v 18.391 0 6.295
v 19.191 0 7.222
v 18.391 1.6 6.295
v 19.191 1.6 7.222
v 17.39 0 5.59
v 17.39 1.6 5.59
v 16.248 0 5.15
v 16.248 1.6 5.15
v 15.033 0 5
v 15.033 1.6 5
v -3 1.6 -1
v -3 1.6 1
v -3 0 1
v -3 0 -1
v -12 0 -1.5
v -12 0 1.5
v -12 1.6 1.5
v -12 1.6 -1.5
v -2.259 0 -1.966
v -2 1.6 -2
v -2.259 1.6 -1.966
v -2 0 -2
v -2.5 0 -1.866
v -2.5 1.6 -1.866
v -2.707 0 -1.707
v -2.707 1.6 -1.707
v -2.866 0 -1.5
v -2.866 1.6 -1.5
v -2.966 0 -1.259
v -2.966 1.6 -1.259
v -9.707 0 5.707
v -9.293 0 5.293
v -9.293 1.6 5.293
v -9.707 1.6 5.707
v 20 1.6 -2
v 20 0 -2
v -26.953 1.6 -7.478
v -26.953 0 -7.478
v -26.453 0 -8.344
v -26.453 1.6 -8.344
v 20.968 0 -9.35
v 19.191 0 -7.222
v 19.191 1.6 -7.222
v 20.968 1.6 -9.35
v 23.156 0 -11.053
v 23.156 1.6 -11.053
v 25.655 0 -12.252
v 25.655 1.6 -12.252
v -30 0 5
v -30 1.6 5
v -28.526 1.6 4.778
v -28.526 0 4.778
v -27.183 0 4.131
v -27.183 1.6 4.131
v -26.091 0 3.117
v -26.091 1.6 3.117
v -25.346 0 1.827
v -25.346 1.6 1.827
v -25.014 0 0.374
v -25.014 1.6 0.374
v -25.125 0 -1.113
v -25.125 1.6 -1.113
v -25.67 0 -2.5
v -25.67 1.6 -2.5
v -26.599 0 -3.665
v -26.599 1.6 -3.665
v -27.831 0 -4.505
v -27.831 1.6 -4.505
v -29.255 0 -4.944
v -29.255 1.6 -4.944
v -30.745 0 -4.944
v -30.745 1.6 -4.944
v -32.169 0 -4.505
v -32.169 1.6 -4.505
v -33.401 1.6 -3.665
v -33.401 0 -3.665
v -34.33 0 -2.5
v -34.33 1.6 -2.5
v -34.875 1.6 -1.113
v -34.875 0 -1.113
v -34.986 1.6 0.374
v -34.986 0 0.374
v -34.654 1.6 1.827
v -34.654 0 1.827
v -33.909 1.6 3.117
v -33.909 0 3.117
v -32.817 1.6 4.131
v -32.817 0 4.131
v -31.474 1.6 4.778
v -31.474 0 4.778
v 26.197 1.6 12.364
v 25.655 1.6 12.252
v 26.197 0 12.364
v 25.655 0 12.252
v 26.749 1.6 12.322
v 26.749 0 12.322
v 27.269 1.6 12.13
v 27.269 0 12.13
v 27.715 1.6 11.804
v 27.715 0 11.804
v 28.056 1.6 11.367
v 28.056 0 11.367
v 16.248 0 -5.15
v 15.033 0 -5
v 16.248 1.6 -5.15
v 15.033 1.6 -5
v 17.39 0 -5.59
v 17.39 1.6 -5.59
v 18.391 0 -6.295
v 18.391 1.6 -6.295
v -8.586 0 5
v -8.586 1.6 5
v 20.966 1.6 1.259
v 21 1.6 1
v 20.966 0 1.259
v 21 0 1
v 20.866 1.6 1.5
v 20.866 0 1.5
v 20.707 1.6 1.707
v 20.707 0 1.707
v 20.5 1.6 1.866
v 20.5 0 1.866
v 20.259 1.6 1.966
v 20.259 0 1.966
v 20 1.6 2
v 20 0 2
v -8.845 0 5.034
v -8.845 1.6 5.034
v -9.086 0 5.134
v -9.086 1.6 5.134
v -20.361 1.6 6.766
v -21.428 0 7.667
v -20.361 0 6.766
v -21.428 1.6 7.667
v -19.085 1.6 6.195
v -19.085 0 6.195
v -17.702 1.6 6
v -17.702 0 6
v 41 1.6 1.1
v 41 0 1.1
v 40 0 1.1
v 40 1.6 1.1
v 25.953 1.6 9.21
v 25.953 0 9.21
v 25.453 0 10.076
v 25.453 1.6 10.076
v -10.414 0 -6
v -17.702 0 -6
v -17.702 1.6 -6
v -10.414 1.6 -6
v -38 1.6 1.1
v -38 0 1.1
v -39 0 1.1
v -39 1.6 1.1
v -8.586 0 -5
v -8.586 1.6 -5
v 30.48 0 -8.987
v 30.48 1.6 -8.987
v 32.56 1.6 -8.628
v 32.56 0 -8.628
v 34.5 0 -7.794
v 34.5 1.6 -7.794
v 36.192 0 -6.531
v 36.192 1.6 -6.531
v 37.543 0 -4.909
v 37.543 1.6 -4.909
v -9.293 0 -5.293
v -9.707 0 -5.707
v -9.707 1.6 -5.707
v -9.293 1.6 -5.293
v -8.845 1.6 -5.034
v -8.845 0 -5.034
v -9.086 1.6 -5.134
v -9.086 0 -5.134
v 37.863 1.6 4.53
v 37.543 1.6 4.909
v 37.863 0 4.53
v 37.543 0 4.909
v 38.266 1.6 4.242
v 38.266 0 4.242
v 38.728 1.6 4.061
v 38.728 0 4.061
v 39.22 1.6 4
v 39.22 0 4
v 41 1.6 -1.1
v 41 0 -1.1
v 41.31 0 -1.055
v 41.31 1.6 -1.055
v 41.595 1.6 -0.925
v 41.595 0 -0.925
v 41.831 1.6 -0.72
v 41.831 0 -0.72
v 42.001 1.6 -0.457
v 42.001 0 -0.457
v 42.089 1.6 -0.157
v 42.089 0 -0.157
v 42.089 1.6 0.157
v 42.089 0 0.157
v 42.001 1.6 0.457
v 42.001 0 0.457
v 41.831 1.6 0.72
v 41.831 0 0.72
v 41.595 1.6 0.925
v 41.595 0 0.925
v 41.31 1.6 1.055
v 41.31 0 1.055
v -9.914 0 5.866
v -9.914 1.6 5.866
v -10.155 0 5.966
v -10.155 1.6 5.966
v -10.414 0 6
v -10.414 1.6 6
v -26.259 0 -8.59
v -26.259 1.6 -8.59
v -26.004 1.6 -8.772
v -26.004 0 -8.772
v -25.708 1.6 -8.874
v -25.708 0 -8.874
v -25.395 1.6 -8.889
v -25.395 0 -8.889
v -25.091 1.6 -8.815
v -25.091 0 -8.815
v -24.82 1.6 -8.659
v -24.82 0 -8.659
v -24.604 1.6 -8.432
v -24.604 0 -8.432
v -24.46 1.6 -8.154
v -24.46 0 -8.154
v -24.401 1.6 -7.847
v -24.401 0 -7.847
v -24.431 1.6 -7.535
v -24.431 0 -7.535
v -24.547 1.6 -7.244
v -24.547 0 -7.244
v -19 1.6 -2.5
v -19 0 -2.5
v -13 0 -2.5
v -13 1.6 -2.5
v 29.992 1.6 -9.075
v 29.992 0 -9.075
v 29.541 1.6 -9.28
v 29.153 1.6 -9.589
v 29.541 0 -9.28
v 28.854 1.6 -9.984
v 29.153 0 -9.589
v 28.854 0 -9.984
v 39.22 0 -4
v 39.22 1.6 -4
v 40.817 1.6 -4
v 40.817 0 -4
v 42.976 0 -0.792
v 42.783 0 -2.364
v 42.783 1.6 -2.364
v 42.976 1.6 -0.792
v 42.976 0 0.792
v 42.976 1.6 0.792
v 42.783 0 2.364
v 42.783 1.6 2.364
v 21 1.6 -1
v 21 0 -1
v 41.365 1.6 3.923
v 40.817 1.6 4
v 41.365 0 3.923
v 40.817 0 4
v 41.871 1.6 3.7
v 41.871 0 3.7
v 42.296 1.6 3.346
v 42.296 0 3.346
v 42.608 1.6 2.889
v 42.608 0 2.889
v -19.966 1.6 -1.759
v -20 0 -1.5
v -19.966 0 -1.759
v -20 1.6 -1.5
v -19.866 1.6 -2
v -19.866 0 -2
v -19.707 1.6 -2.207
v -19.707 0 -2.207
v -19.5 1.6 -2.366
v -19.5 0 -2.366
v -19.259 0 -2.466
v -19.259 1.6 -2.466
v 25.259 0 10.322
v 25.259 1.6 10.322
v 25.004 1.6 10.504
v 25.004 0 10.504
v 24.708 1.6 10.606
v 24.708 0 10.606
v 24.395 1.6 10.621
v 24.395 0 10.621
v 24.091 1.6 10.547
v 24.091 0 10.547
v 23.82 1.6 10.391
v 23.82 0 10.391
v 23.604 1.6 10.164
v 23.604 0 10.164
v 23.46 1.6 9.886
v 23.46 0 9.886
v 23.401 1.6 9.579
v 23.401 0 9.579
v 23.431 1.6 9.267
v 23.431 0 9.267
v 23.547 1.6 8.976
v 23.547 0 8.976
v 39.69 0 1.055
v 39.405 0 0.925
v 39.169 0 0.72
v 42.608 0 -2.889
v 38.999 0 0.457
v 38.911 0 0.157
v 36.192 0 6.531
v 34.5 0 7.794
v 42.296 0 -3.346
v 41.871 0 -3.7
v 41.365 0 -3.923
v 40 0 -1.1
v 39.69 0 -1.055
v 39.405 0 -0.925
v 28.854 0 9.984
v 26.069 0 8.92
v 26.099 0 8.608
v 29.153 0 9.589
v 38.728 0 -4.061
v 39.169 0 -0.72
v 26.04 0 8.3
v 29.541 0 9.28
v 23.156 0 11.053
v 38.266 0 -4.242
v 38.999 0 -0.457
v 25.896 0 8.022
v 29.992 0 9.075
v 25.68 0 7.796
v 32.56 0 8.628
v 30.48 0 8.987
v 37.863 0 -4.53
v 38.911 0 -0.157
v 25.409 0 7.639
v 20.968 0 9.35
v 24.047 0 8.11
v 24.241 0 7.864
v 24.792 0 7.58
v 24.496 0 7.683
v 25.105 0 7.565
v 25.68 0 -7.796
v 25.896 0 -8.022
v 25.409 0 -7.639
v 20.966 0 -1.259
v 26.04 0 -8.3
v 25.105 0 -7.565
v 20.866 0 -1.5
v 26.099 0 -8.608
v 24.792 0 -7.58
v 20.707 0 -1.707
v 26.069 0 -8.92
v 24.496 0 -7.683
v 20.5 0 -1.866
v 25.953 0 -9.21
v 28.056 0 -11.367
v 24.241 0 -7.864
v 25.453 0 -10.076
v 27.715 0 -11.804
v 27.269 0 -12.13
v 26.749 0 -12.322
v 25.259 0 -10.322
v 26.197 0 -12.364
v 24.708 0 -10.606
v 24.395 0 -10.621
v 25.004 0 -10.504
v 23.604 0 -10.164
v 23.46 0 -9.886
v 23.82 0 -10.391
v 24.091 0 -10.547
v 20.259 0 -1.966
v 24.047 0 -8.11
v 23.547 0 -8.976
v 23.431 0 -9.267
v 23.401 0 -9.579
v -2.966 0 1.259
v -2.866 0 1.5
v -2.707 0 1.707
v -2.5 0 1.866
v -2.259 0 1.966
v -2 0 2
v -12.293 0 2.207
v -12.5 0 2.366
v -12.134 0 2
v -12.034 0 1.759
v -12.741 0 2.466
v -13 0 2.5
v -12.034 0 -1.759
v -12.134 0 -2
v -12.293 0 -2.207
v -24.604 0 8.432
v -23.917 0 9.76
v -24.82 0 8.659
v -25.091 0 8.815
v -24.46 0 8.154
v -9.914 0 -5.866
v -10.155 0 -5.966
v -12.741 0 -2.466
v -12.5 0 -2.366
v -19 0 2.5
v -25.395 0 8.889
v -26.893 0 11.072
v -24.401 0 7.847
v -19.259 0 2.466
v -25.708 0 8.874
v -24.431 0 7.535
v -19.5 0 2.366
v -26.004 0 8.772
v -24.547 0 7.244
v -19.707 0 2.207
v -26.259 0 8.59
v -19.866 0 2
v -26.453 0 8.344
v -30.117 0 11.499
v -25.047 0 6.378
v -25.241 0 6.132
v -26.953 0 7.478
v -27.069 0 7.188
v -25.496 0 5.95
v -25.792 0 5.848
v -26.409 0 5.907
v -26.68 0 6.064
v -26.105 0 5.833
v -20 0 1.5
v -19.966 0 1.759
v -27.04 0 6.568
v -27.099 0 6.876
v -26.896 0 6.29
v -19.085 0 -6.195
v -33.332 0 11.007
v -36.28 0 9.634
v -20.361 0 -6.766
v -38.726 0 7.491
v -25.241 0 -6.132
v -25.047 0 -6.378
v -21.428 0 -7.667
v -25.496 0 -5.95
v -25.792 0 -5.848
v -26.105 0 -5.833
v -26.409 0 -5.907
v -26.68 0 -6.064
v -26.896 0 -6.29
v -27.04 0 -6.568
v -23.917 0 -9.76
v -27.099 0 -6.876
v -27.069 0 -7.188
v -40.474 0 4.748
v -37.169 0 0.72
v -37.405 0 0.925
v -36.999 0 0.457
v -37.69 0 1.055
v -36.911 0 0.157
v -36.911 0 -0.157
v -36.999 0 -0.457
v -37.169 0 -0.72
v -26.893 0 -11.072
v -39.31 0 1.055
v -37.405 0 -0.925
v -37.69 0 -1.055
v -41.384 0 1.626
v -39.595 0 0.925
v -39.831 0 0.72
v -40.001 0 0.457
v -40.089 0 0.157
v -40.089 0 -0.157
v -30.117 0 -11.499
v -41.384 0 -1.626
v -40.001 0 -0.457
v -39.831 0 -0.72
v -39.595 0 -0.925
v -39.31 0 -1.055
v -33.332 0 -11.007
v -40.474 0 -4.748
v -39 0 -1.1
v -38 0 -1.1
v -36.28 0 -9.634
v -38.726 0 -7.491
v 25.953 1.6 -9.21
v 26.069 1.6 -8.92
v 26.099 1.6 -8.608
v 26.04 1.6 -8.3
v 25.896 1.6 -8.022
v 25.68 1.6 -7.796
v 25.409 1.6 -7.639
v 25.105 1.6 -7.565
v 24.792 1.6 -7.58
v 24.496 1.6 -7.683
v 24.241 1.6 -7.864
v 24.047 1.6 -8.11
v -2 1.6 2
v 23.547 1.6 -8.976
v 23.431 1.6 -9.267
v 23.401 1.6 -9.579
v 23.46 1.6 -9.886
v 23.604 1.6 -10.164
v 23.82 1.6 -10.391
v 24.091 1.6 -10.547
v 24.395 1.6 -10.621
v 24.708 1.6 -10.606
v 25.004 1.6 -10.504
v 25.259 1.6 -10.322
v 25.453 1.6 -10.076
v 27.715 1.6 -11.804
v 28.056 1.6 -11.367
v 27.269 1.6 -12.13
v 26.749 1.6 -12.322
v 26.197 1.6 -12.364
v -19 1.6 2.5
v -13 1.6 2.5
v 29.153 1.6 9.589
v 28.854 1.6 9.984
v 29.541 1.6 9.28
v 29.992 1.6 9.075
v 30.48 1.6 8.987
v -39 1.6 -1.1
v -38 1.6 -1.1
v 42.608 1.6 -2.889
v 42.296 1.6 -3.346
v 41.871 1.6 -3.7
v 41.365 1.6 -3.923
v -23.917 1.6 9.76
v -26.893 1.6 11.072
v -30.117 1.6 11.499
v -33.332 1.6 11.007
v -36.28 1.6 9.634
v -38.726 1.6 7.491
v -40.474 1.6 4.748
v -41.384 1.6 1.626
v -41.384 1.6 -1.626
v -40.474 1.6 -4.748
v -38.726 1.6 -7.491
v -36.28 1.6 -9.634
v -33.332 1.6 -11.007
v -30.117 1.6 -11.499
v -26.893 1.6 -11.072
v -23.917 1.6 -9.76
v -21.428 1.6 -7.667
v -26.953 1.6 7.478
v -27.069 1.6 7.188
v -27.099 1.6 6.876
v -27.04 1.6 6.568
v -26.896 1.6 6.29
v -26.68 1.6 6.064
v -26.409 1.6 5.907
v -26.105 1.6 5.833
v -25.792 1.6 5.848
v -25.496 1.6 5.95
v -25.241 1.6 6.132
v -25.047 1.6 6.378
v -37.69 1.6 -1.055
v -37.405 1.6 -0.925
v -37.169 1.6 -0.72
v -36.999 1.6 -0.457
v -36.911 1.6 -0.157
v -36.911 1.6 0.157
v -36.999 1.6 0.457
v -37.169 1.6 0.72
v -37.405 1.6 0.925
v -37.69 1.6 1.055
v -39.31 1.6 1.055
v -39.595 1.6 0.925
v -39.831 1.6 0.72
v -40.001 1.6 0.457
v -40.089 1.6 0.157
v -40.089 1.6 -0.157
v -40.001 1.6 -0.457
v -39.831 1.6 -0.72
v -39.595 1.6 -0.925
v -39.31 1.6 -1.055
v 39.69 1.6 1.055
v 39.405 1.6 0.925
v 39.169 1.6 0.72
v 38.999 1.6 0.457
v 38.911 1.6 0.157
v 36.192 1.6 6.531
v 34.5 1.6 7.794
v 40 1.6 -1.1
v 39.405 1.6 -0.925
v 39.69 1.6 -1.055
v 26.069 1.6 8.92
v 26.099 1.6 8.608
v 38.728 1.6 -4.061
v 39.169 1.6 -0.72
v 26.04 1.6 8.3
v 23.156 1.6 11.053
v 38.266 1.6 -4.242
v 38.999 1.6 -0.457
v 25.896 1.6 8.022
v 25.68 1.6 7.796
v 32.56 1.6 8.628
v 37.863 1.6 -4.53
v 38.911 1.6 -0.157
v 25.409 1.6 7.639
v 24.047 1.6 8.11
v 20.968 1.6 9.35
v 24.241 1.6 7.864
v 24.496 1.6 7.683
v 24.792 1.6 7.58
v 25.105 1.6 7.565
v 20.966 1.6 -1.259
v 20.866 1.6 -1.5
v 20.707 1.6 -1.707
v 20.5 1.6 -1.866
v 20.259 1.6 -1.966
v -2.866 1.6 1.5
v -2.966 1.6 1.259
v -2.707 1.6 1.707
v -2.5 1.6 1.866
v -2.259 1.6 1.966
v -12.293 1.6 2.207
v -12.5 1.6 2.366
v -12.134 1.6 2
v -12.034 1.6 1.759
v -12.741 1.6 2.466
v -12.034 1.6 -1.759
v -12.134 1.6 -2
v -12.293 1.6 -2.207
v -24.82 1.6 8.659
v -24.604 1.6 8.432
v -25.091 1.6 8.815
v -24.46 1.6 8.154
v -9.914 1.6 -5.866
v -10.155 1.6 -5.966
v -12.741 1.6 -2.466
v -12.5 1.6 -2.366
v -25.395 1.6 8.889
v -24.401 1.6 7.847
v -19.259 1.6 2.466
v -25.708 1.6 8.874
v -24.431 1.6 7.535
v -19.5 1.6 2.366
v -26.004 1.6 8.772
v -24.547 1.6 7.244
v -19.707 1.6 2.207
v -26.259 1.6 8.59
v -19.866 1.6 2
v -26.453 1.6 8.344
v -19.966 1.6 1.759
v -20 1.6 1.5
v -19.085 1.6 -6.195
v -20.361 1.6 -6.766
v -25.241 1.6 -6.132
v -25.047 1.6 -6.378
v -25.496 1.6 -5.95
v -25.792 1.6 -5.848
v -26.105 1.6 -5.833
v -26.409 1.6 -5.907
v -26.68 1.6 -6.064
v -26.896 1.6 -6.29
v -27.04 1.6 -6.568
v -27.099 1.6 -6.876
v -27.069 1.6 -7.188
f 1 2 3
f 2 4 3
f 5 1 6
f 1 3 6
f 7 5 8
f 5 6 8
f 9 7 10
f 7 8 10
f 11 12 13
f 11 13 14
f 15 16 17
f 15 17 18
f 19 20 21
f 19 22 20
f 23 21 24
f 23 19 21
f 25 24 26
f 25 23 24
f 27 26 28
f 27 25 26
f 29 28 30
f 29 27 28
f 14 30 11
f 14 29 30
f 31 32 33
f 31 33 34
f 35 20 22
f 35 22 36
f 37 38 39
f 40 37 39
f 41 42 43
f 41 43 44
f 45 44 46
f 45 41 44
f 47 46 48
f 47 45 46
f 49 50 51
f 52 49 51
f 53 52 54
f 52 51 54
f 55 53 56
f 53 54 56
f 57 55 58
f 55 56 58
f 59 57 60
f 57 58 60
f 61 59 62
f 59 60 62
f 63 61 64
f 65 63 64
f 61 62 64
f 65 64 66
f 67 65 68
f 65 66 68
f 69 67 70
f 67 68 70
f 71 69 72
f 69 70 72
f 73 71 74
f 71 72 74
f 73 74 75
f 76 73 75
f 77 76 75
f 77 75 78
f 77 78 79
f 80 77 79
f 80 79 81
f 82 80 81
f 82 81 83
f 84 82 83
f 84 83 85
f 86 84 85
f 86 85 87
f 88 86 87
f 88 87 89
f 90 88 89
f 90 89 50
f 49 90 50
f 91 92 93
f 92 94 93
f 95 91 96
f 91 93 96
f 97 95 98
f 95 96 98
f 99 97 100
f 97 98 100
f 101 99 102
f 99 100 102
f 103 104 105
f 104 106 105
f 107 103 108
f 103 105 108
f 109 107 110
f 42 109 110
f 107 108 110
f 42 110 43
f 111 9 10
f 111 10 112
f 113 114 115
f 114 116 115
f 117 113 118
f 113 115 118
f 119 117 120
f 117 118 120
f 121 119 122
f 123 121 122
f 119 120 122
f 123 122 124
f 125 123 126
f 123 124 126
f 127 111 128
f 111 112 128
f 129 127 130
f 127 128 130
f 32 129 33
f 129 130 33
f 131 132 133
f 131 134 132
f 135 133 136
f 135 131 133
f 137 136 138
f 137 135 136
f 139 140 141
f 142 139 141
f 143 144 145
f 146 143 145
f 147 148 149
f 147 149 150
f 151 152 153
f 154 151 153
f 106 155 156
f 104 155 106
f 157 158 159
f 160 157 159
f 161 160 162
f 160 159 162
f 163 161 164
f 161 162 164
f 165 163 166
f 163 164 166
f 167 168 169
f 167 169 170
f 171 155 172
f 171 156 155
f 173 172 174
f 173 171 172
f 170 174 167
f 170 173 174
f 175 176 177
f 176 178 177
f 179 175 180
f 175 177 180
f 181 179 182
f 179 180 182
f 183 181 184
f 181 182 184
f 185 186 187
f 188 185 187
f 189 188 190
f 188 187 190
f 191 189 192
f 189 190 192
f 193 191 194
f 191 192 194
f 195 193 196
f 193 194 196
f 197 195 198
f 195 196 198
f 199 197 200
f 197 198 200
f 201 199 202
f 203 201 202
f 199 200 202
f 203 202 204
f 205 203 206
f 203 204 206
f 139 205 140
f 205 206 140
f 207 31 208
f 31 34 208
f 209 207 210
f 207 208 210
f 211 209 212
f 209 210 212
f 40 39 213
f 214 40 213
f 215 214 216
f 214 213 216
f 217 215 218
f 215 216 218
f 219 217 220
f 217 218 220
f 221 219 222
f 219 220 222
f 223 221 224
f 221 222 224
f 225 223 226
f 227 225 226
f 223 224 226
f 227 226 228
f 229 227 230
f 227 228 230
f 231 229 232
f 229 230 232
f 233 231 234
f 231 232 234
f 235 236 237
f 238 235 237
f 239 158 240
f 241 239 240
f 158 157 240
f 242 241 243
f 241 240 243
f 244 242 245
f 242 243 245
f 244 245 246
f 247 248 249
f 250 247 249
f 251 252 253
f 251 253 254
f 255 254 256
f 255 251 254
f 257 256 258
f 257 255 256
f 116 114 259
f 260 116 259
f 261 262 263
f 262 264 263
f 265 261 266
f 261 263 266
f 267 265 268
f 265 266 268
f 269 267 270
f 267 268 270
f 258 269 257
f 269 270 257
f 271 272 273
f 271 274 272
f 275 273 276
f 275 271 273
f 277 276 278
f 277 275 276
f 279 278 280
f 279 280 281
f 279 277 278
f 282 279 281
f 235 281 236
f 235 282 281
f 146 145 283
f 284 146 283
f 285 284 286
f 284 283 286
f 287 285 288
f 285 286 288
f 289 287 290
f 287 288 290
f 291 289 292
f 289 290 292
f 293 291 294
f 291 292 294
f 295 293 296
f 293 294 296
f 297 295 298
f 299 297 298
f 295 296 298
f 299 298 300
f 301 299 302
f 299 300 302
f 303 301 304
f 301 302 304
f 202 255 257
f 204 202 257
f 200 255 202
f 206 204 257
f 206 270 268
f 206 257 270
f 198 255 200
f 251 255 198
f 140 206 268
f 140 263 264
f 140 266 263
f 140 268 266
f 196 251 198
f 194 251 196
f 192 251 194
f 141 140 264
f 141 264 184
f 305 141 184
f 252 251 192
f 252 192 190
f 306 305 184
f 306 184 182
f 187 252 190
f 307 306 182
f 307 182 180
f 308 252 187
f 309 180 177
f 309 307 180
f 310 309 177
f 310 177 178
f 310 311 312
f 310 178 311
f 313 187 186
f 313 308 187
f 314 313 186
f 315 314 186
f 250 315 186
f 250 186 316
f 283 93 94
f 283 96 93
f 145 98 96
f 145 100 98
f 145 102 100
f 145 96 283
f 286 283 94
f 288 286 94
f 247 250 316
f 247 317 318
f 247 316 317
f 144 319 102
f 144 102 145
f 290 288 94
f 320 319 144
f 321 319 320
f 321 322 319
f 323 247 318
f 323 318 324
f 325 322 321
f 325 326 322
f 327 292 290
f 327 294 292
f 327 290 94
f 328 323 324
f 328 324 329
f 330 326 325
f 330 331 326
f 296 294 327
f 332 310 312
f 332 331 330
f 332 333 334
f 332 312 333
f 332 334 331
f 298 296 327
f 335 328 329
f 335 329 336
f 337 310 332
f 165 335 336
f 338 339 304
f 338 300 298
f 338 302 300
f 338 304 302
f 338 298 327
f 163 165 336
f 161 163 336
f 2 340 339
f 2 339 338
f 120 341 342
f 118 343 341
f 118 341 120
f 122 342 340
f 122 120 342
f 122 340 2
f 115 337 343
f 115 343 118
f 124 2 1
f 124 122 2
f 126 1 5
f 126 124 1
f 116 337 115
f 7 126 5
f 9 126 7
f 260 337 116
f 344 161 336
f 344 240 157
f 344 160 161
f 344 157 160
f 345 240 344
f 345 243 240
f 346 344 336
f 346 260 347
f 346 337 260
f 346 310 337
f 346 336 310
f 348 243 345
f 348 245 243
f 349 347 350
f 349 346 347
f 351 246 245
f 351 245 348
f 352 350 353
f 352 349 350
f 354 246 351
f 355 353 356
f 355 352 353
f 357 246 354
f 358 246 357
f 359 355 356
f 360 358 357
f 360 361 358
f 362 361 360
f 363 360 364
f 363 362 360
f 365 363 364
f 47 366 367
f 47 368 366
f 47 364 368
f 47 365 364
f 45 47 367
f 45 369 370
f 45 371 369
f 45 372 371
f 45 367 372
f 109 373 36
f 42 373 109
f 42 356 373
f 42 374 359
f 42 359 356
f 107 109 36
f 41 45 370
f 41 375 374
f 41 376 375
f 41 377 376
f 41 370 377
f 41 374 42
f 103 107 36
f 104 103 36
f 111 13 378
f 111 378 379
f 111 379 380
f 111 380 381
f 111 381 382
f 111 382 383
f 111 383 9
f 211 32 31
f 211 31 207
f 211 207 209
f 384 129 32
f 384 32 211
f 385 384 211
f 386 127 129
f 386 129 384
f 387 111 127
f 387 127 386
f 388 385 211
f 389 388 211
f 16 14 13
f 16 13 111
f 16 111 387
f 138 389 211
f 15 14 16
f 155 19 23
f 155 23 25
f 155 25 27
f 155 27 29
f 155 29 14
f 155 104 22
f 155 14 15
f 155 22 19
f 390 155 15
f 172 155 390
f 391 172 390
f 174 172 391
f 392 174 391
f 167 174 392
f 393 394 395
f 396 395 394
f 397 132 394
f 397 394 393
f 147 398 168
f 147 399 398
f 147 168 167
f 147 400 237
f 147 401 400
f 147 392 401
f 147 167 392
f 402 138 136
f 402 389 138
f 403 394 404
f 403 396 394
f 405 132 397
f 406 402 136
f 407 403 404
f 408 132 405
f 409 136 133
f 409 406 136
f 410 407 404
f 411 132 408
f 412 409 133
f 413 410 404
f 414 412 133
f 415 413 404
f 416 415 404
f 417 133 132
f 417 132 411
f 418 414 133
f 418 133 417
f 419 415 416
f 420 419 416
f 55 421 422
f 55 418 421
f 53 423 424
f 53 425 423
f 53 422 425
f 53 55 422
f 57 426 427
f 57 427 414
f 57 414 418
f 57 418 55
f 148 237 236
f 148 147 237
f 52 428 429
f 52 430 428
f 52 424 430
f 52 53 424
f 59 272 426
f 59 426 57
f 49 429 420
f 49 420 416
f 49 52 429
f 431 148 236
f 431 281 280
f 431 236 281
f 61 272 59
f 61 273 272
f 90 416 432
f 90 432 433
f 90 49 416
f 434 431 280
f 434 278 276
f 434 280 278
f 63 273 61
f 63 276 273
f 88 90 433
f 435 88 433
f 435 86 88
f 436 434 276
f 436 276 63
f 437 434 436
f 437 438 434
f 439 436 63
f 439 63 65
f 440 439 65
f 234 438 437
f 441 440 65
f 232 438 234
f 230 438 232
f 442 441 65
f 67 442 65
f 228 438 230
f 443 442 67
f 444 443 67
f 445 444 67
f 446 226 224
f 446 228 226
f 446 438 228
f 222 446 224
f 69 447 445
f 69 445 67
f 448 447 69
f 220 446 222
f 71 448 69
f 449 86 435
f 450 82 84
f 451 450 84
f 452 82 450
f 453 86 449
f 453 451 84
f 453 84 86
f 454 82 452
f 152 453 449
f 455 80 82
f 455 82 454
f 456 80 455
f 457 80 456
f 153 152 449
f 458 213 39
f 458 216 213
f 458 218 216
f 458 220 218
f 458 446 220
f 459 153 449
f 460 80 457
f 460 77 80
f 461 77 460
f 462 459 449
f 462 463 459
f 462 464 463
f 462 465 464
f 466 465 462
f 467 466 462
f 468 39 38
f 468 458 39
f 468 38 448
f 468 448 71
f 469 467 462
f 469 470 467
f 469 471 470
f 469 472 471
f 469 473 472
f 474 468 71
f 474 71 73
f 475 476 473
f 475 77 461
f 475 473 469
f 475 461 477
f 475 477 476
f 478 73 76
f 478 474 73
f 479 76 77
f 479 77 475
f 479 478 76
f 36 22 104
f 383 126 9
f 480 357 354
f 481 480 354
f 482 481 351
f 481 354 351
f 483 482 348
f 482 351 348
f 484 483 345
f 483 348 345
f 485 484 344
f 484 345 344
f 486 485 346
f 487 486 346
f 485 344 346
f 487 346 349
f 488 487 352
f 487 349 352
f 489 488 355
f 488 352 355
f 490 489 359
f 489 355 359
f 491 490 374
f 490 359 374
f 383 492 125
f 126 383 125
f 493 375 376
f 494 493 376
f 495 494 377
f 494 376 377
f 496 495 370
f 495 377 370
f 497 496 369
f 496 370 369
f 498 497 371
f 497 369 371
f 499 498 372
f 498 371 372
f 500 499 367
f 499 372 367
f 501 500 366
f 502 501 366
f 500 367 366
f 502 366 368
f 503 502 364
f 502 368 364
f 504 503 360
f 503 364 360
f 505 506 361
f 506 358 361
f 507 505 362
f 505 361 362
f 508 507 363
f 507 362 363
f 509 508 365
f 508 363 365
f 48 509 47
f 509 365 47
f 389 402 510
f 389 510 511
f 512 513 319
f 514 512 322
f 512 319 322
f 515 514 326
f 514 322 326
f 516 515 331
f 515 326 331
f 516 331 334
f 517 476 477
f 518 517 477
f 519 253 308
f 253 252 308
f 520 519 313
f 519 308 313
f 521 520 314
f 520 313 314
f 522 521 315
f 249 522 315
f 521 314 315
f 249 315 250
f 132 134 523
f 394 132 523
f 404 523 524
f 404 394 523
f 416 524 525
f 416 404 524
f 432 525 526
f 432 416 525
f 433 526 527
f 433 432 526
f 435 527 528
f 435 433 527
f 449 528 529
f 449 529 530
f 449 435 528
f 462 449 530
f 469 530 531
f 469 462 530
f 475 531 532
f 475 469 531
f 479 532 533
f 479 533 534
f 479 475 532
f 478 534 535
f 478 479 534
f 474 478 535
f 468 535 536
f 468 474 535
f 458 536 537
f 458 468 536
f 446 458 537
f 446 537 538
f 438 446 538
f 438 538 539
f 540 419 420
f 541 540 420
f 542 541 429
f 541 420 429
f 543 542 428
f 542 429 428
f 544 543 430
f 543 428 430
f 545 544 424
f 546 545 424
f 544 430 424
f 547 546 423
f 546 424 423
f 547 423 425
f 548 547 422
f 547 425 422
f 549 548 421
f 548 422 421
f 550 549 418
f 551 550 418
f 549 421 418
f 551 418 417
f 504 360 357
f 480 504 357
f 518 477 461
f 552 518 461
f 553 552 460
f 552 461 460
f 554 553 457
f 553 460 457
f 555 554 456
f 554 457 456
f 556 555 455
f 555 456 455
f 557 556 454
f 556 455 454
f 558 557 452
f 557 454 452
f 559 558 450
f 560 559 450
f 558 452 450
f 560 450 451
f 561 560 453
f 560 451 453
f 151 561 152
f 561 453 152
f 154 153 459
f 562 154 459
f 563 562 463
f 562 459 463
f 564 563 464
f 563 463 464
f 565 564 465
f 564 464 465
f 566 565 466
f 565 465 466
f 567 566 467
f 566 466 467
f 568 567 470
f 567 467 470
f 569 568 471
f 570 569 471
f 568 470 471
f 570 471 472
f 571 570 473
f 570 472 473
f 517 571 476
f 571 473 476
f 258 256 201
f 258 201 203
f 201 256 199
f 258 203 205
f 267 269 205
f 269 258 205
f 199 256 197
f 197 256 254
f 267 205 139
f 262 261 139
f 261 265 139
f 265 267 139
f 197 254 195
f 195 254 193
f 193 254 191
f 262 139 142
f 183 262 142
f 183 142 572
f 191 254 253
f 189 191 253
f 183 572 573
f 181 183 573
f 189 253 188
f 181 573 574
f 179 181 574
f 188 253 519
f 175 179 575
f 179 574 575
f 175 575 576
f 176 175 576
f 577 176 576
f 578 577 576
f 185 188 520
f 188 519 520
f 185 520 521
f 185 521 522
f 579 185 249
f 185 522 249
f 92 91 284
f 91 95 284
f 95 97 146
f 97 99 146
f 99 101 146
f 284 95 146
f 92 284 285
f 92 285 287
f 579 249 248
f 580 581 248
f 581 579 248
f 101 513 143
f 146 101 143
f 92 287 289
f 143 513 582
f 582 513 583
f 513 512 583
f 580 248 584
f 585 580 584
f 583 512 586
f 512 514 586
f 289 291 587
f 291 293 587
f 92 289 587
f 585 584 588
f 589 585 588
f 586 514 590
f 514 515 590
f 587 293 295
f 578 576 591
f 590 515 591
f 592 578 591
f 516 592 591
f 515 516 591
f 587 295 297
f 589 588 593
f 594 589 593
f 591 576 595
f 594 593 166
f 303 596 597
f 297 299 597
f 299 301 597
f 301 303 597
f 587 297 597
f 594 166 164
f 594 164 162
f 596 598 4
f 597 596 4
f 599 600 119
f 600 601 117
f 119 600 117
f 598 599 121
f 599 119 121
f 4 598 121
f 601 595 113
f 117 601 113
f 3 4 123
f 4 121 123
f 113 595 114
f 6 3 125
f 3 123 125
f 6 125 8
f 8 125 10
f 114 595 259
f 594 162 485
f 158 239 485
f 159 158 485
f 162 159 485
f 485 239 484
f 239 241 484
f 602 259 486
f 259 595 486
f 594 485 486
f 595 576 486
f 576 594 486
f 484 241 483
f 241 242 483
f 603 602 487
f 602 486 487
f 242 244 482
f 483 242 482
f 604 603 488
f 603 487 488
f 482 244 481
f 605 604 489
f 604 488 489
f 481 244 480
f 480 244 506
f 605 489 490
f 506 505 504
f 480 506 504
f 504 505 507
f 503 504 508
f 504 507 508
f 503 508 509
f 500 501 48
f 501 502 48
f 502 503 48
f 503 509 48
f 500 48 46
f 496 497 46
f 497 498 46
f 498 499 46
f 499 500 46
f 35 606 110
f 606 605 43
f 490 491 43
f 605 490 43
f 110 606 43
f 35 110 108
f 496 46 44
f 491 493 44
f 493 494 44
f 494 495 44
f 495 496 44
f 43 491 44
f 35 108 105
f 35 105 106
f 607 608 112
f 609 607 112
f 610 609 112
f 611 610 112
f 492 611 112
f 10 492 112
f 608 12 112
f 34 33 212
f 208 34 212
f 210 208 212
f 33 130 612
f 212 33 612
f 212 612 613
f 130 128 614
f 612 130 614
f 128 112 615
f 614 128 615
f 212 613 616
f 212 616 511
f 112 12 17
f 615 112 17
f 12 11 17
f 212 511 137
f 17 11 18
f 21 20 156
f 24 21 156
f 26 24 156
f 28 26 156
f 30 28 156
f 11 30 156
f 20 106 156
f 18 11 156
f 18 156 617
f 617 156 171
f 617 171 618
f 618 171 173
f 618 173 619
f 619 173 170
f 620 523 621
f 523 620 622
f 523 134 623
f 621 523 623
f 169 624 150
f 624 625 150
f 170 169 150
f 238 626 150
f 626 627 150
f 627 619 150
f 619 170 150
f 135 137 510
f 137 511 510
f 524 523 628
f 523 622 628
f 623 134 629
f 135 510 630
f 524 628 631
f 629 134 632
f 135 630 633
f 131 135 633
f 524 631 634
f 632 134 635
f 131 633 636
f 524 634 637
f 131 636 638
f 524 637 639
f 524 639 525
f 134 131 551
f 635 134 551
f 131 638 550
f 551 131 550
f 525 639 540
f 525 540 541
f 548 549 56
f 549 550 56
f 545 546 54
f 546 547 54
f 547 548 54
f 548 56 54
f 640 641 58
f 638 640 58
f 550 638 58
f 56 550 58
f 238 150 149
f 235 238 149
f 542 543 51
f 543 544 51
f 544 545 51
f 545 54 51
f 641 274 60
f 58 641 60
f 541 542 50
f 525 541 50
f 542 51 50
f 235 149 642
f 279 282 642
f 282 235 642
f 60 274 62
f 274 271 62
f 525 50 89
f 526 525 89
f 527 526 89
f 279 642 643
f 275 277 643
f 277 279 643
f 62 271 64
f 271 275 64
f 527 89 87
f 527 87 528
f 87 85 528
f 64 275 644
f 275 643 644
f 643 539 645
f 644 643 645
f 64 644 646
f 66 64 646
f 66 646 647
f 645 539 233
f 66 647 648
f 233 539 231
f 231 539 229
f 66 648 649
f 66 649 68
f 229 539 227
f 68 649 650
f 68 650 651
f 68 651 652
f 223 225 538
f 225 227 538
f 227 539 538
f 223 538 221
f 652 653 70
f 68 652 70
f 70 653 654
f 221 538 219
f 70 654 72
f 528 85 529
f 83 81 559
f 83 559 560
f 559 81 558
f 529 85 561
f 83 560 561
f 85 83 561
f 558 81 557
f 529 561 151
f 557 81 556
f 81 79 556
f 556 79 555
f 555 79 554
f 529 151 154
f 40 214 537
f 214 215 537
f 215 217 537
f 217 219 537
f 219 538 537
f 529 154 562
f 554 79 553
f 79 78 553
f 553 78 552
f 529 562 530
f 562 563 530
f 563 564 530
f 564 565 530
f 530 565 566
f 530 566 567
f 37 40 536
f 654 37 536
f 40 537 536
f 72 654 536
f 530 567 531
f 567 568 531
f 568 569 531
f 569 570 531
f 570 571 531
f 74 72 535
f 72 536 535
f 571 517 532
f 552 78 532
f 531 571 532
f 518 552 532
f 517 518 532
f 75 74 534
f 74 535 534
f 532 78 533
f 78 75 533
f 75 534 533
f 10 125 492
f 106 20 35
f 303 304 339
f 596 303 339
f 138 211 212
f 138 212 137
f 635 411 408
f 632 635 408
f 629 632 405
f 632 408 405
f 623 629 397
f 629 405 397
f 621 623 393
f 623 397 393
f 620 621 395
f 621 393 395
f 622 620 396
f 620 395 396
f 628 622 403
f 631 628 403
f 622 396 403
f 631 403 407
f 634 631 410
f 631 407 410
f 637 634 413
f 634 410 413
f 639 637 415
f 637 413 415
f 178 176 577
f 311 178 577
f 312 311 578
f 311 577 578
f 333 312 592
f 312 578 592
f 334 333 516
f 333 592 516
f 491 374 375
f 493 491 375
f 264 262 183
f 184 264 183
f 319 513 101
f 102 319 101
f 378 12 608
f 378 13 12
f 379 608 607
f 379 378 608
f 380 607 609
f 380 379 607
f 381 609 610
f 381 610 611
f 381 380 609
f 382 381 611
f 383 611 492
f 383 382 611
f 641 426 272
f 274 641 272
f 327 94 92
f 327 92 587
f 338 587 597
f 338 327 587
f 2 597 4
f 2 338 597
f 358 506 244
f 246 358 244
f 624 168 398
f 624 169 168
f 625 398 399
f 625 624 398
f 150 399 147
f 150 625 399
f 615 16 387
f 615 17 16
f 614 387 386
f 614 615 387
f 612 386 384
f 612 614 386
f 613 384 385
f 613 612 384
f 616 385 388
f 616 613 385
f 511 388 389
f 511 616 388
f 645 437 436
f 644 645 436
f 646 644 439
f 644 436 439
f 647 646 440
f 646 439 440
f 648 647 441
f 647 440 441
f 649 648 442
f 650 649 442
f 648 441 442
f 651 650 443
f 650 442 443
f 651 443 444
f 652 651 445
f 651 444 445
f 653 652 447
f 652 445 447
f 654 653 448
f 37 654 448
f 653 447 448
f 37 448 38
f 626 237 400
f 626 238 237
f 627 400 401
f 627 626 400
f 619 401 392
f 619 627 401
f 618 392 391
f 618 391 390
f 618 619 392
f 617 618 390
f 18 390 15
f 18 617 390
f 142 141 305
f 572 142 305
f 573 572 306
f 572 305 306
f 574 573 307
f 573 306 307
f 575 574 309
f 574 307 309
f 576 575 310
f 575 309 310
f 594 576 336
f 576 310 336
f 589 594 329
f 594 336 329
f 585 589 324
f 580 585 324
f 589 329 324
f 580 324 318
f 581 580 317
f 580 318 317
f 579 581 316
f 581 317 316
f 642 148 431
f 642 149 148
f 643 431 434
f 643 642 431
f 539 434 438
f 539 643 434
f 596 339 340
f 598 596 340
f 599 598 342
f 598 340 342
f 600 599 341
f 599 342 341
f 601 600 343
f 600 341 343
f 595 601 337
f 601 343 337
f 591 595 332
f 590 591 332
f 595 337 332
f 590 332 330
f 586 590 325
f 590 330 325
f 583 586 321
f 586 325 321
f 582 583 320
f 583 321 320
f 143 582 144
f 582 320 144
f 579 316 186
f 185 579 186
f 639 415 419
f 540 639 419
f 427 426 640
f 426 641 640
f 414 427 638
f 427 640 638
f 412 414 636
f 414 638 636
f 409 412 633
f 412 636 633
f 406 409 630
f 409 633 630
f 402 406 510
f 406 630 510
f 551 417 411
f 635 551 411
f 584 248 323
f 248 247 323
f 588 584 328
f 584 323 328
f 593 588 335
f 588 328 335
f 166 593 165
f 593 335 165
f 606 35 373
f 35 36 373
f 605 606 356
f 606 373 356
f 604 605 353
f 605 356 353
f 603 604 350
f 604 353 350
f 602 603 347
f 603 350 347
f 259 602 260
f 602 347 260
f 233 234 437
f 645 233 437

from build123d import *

# Parameters (mm, degrees)
BOSS_EXTRUDE1_DEPTH = 1.6
CUT_EXTRUDE1_DEPTH  = 45.950639595
CUT_EXTRUDE2_DEPTH  = 45.950639595
FILLET1_R           = 5
SKETCH4_W           = 8
SKETCH4_H           = 5
CUT_EXTRUDE3_DEPTH  = 45.950639595
FILLET2_R           = 1
FILLET3_R           = 1
SKETCH6_W           = 24
SKETCH6_H           = 4
CUT_EXTRUDE4_DEPTH  = 45.950639595
SKETCH7_R           = 5
CUT_EXTRUDE5_DEPTH  = 45.950639595
FILLET4_R           = 1
CUT_EXTRUDE6_DEPTH  = 45.950639595
CIRPATTERN1_COUNT   = 2
CIRPATTERN1_ANGLE   = 120
FILLET5_R           = 2


with BuildPart() as part:
    # Sketch1 → Boss-Extrude1 (new body)
    with BuildSketch(Plane(origin=(0, 0, 0), x_dir=(1, 0, 0), z_dir=(0, 1, 0))):
        with BuildLine():
            Line((-9, 5), (18, 5))
            ThreePointArc((18, 5), (43, 0), (18, -5))
            Line((18, -5), (-9, -5))
            Line((-9, -5), (-10, -6))
            Line((-10, -6), (-20.189291565, -6))
            ThreePointArc((-20.189291565, -6), (-41.5, 0), (-20.189291565, 6))
            Line((-20.189291565, 6), (-10, 6))
            Line((-10, 6), (-9, 5))
        make_face()
    extrude(amount=BOSS_EXTRUDE1_DEPTH)

    # Sketch2 → Cut-Extrude1 (cut, through all)
    with BuildSketch(Plane(origin=(0, 0, 0), x_dir=(1, 0, 0), z_dir=(0, 1, 0))):
        with BuildLine():
            Line((40, 1.1), (41, 1.1))
            ThreePointArc((41, 1.1), (42.1, 0), (41, -1.1))
            Line((41, -1.1), (40, -1.1))
            ThreePointArc((40, -1.1), (38.9, 0), (40, 1.1))
        make_face()
        with BuildLine():
            Line((25.952627944, -9.210254038), (25.452627944, -10.076279442))
            ThreePointArc((25.452627944, -10.076279442), (23.95, -10.478907386), (23.547372056, -8.976279442))
            Line((23.547372056, -8.976279442), (24.047372056, -8.110254038))
            ThreePointArc((24.047372056, -8.110254038), (25.55, -7.707626094), (25.952627944, -9.210254038))
        make_face()
        with BuildLine():
            Line((24.047372056, 8.110254038), (23.547372056, 8.976279442))
            ThreePointArc((23.547372056, 8.976279442), (23.95, 10.478907386), (25.452627944, 10.076279442))
            Line((25.452627944, 10.076279442), (25.952627944, 9.210254038))
            ThreePointArc((25.952627944, 9.210254038), (25.55, 7.707626094), (24.047372056, 8.110254038))
        make_face()
    extrude(amount=CUT_EXTRUDE1_DEPTH, mode=Mode.SUBTRACT)

    # Sketch3 → Cut-Extrude2 (cut, through all)
    with BuildSketch(Plane(origin=(0, 0, 0), x_dir=(1, 0, 0), z_dir=(0, 1, 0))):
        with BuildLine():
            Line((-25.047372056, -6.37820323), (-24.547372056, -7.244228634))
            ThreePointArc((-24.547372056, -7.244228634), (-24.95, -8.746856578), (-26.452627944, -8.344228634))
            Line((-26.452627944, -8.344228634), (-26.952627944, -7.47820323))
            ThreePointArc((-26.952627944, -7.47820323), (-26.55, -5.975575286), (-25.047372056, -6.37820323))
        make_face()
        with BuildLine():
            Line((-38, -1.1), (-39, -1.1))
            ThreePointArc((-39, -1.1), (-40.1, 0), (-39, 1.1))
            Line((-39, 1.1), (-38, 1.1))
            ThreePointArc((-38, 1.1), (-36.9, 0), (-38, -1.1))
        make_face()
        with BuildLine():
            Line((-26.952627944, 7.47820323), (-26.452627944, 8.344228634))
            ThreePointArc((-26.452627944, 8.344228634), (-24.95, 8.746856578), (-24.547372056, 7.244228634))
            Line((-24.547372056, 7.244228634), (-25.047372056, 6.37820323))
            ThreePointArc((-25.047372056, 6.37820323), (-26.55, 5.975575286), (-26.952627944, 7.47820323))
        make_face()
    extrude(amount=CUT_EXTRUDE2_DEPTH, mode=Mode.SUBTRACT)

    # Fillet1
    fillet1_edges = [part.edges().sort_by_distance(p)[0] for p in [
        (18, 0.8, -5),
        (-20.189291565, 0.8, -6),
        (-20.189291565, 0.8, 6),
        (18, 0.8, 5),
    ]]
    fillet(fillet1_edges, radius=FILLET1_R)

    # Sketch4 → Cut-Extrude3 (cut, through all)
    with BuildSketch(Plane(origin=(0, 0, 0), x_dir=(1, 0, 0), z_dir=(0, 1, 0))):
        with Locations((-16, 0)):
            Rectangle(SKETCH4_W, SKETCH4_H)
    extrude(amount=CUT_EXTRUDE3_DEPTH, mode=Mode.SUBTRACT)

    # Fillet2
    fillet2_edges = [part.edges().sort_by_distance(p)[0] for p in [
        (-12, 0.8, 2.5),
        (-12, 0.8, -2.5),
        (-20, 0.8, 2.5),
        (-20, 0.8, -2.5),
    ]]
    fillet(fillet2_edges, radius=FILLET2_R)

    # Fillet3
    fillet3_edges = [part.edges().sort_by_distance(p)[0] for p in [
        (-9, 0.8, -5),
        (-10, 0.8, -6),
        (-10, 0.8, 6),
        (-9, 0.8, 5),
    ]]
    fillet(fillet3_edges, radius=FILLET3_R)

    # Sketch6 → Cut-Extrude4 (cut, through all)
    with BuildSketch(Plane(origin=(0, 1.6, 0), x_dir=(1, 0, 0), z_dir=(0, 1, 0))):
        with Locations((9, 0)):
            Rectangle(SKETCH6_W, SKETCH6_H)
    extrude(amount=-CUT_EXTRUDE4_DEPTH, mode=Mode.SUBTRACT)

    # Sketch7 → Cut-Extrude5 (cut, through all)
    with BuildSketch(Plane(origin=(0, 1.6, 0), x_dir=(1, 0, 0), z_dir=(0, 1, 0))):
        with Locations((-30, 0)):
            Circle(SKETCH7_R)
    extrude(amount=-CUT_EXTRUDE5_DEPTH, mode=Mode.SUBTRACT)

    # Fillet4
    fillet4_edges = [part.edges().sort_by_distance(p)[0] for p in [
        (21, 0.8, -2),
        (21, 0.8, 2),
        (-3, 0.8, 2),
        (-3, 0.8, -2),
    ]]
    fillet(fillet4_edges, radius=FILLET4_R)

    # Sketch8 → Cut-Extrude6 (cut, through all)
    with BuildSketch(Plane(origin=(0, 1.6, 0), x_dir=(1, 0, 0), z_dir=(0, 1, 0))):
        with BuildLine():
            Line((27.279443177, 12.712142643), (29.432972741, 8.982120022))
            ThreePointArc((29.432972741, 8.982120022), (34.5, 7.794228634), (38.062257748, 4))
            Line((38.062257748, 4), (42.369316877, 4))
            ThreePointArc((42.369316877, 4), (36.5, 11.258330249), (27.279443177, 12.712142643))
        make_face()
    cut_extrude6 = extrude(amount=-CUT_EXTRUDE6_DEPTH, mode=Mode.SUBTRACT)

    # CirPattern1: Cut-Extrude6 ×2 about axis
    cirpattern1_axis = Axis((30, -4.392088632, 0), (0, -1, 0))
    for i in range(1, CIRPATTERN1_COUNT):
        add(cut_extrude6.rotate(cirpattern1_axis, i * CIRPATTERN1_ANGLE / (CIRPATTERN1_COUNT - 1)), mode=Mode.SUBTRACT)

    # Fillet5
    fillet5_edges = [part.edges().sort_by_distance(p)[0] for p in [
        (38.062257748, 0.8, 4),
        (42.369316877, 0.8, 4),
        (42.369316877, 0.8, -4),
        (38.062257748, 0.8, -4),
        (29.432972741, 0.8, -8.982120022),
        (27.279443177, 0.8, -12.712142643),
        (27.279443177, 0.8, 12.712142643),
        (29.432972741, 0.8, 8.982120022),
    ]]
    fillet(fillet5_edges, radius=FILLET5_R)


solid = part.part
